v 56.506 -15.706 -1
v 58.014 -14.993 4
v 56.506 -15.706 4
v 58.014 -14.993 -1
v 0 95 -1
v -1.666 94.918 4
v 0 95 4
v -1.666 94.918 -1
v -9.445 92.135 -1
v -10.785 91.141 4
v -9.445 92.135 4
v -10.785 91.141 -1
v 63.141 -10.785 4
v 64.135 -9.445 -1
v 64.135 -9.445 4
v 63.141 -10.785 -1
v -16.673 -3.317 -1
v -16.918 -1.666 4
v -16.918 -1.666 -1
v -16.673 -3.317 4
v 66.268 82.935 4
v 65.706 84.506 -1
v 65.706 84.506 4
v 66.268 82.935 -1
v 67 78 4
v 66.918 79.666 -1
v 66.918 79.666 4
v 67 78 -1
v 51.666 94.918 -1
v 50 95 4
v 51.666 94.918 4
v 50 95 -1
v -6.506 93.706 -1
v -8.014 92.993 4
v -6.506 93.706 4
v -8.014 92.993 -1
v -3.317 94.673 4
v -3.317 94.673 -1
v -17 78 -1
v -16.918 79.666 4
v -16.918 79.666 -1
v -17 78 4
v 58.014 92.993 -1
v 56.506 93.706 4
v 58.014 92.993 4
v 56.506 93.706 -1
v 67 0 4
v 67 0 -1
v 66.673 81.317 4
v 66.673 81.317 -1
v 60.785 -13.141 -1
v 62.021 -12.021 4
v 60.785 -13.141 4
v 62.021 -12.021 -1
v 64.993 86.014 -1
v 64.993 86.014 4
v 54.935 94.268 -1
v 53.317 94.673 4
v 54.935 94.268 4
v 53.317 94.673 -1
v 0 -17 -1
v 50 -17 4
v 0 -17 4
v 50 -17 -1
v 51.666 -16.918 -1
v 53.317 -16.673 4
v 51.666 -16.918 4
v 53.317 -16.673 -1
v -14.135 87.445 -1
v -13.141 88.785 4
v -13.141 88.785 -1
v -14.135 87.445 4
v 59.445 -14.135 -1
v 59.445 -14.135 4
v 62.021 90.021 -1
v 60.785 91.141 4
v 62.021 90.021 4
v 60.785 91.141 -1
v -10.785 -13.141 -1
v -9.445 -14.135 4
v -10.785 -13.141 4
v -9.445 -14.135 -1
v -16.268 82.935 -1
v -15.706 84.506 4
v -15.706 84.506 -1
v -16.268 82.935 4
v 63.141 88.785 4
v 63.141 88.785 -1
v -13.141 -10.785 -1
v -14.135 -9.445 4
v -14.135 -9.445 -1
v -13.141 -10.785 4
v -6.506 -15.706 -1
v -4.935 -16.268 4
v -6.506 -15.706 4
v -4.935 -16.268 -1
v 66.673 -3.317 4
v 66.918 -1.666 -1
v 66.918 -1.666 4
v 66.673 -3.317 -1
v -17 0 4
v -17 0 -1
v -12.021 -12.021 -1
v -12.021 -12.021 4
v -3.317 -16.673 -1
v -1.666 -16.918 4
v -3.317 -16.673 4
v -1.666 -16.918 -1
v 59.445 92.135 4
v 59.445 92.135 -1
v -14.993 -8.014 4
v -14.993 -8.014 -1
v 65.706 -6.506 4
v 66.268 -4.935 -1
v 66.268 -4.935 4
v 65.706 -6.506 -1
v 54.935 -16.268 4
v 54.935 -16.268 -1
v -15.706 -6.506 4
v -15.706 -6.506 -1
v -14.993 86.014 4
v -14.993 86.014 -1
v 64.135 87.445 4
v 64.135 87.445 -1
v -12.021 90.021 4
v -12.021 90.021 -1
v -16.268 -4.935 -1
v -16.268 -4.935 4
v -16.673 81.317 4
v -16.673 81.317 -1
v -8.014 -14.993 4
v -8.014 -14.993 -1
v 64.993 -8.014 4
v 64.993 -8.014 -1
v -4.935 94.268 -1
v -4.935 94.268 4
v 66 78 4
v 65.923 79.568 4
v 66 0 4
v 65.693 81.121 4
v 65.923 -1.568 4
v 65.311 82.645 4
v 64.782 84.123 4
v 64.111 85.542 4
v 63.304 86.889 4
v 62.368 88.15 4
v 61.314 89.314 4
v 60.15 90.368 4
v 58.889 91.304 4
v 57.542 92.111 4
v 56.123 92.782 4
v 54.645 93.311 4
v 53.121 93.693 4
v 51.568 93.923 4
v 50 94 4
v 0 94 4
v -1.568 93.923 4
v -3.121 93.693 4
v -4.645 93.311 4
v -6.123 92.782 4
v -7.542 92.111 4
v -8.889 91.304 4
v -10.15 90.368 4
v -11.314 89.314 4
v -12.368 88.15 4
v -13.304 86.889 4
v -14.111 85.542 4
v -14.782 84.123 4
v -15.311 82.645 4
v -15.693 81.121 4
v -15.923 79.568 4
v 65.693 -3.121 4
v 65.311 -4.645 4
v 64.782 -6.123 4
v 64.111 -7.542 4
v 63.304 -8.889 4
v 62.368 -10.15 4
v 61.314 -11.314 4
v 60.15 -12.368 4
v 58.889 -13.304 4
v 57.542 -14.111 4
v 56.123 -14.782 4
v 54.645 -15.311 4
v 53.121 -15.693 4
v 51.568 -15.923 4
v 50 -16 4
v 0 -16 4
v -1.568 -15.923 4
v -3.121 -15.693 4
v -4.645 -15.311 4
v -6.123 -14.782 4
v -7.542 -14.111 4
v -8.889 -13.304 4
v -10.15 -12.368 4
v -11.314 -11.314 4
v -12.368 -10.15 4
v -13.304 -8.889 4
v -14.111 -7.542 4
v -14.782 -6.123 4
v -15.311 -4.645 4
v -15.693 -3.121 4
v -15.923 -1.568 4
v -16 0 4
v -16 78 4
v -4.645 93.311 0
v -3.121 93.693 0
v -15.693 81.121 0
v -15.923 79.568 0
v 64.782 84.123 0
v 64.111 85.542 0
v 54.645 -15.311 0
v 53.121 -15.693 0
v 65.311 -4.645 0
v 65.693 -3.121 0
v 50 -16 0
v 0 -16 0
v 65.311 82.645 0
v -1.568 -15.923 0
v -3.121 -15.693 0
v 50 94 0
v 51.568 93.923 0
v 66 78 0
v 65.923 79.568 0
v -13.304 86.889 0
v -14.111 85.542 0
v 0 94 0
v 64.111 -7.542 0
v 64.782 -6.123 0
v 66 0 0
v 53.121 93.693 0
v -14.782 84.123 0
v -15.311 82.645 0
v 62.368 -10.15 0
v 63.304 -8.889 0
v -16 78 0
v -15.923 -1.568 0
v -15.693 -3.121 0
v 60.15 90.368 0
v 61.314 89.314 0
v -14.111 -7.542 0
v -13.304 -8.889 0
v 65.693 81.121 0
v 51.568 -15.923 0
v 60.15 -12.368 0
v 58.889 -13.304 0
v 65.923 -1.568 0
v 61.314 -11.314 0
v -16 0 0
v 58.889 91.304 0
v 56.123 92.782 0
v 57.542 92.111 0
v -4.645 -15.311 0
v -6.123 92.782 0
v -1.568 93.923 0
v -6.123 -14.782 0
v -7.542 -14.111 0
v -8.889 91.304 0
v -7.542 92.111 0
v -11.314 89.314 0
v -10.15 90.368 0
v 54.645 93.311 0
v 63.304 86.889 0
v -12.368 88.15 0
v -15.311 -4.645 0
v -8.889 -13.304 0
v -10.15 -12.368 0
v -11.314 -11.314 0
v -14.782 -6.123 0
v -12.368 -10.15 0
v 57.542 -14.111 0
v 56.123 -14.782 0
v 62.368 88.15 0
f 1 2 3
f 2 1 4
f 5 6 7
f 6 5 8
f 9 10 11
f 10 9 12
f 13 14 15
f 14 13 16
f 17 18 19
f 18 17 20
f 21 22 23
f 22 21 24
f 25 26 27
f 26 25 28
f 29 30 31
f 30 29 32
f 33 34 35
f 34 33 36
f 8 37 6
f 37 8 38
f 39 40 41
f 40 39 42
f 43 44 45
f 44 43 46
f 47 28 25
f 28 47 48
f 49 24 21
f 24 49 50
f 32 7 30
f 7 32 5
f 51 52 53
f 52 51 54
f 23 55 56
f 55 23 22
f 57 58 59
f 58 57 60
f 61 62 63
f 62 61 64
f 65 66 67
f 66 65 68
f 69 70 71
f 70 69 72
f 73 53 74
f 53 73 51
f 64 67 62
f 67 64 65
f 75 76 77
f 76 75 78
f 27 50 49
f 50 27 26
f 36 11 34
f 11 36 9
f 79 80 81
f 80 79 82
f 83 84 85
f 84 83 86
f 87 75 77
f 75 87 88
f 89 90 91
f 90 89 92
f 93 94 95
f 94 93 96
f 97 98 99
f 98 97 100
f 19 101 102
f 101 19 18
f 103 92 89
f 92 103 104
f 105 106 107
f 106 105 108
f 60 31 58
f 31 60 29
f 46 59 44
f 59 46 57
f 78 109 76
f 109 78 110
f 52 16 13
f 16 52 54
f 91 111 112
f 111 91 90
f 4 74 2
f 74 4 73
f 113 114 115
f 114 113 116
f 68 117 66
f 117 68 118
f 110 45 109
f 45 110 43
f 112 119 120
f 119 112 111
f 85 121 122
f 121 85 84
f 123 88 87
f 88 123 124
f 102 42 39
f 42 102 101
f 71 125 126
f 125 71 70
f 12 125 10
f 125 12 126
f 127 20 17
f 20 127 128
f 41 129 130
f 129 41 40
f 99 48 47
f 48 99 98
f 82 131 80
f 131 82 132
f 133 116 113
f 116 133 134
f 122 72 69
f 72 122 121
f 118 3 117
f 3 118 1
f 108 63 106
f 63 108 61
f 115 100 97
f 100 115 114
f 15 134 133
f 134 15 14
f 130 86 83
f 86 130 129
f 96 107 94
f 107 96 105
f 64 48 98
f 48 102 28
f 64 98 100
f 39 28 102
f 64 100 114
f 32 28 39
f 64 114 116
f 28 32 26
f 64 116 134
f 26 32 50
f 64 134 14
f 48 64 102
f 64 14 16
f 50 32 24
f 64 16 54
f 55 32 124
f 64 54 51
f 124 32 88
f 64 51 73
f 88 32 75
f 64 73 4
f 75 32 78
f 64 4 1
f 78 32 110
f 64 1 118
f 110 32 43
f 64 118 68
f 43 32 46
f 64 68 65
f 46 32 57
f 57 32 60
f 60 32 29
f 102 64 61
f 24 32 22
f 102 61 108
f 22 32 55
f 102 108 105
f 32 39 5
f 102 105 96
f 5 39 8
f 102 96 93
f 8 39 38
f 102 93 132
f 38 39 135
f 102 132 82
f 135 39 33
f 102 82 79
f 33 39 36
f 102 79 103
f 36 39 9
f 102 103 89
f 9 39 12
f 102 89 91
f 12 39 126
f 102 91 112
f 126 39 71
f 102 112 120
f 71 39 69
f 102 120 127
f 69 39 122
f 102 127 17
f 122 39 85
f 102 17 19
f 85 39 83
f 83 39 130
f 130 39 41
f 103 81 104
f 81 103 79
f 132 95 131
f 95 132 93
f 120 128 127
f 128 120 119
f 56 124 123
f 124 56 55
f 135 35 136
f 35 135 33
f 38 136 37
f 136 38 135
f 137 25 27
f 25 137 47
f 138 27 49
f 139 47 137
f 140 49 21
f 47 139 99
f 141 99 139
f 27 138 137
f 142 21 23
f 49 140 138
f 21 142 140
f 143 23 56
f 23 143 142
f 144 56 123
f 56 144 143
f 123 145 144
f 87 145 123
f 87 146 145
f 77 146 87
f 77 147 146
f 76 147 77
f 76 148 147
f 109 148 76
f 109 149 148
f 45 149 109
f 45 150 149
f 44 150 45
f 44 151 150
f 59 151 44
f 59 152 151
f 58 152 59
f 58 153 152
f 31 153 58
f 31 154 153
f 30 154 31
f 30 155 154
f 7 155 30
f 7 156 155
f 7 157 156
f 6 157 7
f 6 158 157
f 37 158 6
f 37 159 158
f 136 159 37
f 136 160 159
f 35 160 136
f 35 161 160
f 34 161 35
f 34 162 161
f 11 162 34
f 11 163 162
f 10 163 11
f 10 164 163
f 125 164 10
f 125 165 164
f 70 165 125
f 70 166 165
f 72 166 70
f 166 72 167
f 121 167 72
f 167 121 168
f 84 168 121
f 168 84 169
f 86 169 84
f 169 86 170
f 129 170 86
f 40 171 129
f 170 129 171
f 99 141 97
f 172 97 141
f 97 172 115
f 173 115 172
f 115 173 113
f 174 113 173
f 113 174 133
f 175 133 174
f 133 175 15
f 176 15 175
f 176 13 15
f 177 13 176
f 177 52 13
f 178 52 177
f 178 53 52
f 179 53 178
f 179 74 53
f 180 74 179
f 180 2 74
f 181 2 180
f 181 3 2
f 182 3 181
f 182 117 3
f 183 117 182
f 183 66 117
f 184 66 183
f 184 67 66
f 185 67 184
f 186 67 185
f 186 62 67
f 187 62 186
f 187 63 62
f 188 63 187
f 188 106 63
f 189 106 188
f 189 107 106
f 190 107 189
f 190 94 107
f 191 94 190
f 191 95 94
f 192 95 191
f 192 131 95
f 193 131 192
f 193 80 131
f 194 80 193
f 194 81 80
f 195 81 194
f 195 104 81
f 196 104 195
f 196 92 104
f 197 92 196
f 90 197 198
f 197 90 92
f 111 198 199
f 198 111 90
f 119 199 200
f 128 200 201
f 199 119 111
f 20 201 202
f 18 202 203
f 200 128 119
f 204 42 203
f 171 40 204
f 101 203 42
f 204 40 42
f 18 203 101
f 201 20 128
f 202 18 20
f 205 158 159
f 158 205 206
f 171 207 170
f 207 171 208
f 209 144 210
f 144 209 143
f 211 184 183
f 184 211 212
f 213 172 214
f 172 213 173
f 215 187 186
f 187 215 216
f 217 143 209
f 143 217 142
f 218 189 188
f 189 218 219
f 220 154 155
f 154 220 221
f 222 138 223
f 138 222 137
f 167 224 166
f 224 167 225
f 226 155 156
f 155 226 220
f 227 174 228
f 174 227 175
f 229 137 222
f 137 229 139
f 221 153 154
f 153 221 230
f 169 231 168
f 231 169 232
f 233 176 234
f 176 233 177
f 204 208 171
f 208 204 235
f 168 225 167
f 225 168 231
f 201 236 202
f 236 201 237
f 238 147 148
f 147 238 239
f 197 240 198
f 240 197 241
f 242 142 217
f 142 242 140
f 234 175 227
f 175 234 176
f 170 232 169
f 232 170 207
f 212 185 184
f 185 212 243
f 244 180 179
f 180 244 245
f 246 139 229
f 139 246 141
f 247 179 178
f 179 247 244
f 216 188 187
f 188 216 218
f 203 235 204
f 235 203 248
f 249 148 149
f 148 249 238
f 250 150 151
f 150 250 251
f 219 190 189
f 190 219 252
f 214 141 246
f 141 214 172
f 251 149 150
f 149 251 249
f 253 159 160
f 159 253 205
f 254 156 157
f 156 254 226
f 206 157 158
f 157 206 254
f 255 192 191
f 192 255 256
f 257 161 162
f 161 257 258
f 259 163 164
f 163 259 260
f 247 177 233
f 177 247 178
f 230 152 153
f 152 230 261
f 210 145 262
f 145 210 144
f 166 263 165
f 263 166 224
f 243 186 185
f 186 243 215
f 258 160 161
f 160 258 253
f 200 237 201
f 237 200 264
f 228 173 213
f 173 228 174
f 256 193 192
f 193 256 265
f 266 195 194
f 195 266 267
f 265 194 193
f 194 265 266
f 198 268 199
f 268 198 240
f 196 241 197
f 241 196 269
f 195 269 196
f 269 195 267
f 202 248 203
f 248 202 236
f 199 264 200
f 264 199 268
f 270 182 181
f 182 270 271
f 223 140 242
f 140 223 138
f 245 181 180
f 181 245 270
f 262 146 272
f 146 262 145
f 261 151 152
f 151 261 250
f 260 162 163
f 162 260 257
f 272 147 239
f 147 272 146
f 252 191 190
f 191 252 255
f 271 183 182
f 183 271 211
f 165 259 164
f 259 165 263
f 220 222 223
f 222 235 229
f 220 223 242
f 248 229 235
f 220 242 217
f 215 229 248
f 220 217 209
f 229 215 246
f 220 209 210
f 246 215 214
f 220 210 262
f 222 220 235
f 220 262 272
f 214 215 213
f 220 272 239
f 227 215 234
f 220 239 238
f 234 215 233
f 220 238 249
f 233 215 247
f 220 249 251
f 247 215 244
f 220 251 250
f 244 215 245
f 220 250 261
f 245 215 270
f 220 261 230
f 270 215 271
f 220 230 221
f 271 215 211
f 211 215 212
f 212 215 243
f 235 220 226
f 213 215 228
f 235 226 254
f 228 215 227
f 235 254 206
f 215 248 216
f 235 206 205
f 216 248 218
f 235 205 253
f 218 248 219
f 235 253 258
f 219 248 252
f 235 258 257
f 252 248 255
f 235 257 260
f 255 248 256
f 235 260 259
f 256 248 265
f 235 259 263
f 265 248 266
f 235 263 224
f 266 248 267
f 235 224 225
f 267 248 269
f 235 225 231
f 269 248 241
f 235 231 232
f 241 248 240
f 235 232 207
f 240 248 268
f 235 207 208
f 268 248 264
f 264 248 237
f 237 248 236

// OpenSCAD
// # Parametric lid

// MILFINA Speisetopfen
l = 110; w = 82; r = 16; h = 4; d = 1;

// ZZU BIO-Speisetopfen
// l = 117; w = 83; r = 10; h = 7; d = 1;

$fn = 64;

module rbox(w, l, r) {
  union(){
    translate([0, 0, 0]) circle(r = r);
    translate([w - 2*r, 0, 0]) circle(r = r);
    translate([w - 2*r, l-2*r, 0]) circle(r = r);
    translate([0, l-2*r, 0]) circle(r = r);
    translate([0, -r, 0]) square([w-2*r,l]);
    translate([-r, 0, 0]) square([w,l-2*r]);
  }
}

difference() {
  translate([0, 0, -d])
  linear_extrude(height = h+d) 
  rbox(w+2*d, l+2*d, r+d);
  linear_extrude(height = h)
  rbox(w, l, r);
}
